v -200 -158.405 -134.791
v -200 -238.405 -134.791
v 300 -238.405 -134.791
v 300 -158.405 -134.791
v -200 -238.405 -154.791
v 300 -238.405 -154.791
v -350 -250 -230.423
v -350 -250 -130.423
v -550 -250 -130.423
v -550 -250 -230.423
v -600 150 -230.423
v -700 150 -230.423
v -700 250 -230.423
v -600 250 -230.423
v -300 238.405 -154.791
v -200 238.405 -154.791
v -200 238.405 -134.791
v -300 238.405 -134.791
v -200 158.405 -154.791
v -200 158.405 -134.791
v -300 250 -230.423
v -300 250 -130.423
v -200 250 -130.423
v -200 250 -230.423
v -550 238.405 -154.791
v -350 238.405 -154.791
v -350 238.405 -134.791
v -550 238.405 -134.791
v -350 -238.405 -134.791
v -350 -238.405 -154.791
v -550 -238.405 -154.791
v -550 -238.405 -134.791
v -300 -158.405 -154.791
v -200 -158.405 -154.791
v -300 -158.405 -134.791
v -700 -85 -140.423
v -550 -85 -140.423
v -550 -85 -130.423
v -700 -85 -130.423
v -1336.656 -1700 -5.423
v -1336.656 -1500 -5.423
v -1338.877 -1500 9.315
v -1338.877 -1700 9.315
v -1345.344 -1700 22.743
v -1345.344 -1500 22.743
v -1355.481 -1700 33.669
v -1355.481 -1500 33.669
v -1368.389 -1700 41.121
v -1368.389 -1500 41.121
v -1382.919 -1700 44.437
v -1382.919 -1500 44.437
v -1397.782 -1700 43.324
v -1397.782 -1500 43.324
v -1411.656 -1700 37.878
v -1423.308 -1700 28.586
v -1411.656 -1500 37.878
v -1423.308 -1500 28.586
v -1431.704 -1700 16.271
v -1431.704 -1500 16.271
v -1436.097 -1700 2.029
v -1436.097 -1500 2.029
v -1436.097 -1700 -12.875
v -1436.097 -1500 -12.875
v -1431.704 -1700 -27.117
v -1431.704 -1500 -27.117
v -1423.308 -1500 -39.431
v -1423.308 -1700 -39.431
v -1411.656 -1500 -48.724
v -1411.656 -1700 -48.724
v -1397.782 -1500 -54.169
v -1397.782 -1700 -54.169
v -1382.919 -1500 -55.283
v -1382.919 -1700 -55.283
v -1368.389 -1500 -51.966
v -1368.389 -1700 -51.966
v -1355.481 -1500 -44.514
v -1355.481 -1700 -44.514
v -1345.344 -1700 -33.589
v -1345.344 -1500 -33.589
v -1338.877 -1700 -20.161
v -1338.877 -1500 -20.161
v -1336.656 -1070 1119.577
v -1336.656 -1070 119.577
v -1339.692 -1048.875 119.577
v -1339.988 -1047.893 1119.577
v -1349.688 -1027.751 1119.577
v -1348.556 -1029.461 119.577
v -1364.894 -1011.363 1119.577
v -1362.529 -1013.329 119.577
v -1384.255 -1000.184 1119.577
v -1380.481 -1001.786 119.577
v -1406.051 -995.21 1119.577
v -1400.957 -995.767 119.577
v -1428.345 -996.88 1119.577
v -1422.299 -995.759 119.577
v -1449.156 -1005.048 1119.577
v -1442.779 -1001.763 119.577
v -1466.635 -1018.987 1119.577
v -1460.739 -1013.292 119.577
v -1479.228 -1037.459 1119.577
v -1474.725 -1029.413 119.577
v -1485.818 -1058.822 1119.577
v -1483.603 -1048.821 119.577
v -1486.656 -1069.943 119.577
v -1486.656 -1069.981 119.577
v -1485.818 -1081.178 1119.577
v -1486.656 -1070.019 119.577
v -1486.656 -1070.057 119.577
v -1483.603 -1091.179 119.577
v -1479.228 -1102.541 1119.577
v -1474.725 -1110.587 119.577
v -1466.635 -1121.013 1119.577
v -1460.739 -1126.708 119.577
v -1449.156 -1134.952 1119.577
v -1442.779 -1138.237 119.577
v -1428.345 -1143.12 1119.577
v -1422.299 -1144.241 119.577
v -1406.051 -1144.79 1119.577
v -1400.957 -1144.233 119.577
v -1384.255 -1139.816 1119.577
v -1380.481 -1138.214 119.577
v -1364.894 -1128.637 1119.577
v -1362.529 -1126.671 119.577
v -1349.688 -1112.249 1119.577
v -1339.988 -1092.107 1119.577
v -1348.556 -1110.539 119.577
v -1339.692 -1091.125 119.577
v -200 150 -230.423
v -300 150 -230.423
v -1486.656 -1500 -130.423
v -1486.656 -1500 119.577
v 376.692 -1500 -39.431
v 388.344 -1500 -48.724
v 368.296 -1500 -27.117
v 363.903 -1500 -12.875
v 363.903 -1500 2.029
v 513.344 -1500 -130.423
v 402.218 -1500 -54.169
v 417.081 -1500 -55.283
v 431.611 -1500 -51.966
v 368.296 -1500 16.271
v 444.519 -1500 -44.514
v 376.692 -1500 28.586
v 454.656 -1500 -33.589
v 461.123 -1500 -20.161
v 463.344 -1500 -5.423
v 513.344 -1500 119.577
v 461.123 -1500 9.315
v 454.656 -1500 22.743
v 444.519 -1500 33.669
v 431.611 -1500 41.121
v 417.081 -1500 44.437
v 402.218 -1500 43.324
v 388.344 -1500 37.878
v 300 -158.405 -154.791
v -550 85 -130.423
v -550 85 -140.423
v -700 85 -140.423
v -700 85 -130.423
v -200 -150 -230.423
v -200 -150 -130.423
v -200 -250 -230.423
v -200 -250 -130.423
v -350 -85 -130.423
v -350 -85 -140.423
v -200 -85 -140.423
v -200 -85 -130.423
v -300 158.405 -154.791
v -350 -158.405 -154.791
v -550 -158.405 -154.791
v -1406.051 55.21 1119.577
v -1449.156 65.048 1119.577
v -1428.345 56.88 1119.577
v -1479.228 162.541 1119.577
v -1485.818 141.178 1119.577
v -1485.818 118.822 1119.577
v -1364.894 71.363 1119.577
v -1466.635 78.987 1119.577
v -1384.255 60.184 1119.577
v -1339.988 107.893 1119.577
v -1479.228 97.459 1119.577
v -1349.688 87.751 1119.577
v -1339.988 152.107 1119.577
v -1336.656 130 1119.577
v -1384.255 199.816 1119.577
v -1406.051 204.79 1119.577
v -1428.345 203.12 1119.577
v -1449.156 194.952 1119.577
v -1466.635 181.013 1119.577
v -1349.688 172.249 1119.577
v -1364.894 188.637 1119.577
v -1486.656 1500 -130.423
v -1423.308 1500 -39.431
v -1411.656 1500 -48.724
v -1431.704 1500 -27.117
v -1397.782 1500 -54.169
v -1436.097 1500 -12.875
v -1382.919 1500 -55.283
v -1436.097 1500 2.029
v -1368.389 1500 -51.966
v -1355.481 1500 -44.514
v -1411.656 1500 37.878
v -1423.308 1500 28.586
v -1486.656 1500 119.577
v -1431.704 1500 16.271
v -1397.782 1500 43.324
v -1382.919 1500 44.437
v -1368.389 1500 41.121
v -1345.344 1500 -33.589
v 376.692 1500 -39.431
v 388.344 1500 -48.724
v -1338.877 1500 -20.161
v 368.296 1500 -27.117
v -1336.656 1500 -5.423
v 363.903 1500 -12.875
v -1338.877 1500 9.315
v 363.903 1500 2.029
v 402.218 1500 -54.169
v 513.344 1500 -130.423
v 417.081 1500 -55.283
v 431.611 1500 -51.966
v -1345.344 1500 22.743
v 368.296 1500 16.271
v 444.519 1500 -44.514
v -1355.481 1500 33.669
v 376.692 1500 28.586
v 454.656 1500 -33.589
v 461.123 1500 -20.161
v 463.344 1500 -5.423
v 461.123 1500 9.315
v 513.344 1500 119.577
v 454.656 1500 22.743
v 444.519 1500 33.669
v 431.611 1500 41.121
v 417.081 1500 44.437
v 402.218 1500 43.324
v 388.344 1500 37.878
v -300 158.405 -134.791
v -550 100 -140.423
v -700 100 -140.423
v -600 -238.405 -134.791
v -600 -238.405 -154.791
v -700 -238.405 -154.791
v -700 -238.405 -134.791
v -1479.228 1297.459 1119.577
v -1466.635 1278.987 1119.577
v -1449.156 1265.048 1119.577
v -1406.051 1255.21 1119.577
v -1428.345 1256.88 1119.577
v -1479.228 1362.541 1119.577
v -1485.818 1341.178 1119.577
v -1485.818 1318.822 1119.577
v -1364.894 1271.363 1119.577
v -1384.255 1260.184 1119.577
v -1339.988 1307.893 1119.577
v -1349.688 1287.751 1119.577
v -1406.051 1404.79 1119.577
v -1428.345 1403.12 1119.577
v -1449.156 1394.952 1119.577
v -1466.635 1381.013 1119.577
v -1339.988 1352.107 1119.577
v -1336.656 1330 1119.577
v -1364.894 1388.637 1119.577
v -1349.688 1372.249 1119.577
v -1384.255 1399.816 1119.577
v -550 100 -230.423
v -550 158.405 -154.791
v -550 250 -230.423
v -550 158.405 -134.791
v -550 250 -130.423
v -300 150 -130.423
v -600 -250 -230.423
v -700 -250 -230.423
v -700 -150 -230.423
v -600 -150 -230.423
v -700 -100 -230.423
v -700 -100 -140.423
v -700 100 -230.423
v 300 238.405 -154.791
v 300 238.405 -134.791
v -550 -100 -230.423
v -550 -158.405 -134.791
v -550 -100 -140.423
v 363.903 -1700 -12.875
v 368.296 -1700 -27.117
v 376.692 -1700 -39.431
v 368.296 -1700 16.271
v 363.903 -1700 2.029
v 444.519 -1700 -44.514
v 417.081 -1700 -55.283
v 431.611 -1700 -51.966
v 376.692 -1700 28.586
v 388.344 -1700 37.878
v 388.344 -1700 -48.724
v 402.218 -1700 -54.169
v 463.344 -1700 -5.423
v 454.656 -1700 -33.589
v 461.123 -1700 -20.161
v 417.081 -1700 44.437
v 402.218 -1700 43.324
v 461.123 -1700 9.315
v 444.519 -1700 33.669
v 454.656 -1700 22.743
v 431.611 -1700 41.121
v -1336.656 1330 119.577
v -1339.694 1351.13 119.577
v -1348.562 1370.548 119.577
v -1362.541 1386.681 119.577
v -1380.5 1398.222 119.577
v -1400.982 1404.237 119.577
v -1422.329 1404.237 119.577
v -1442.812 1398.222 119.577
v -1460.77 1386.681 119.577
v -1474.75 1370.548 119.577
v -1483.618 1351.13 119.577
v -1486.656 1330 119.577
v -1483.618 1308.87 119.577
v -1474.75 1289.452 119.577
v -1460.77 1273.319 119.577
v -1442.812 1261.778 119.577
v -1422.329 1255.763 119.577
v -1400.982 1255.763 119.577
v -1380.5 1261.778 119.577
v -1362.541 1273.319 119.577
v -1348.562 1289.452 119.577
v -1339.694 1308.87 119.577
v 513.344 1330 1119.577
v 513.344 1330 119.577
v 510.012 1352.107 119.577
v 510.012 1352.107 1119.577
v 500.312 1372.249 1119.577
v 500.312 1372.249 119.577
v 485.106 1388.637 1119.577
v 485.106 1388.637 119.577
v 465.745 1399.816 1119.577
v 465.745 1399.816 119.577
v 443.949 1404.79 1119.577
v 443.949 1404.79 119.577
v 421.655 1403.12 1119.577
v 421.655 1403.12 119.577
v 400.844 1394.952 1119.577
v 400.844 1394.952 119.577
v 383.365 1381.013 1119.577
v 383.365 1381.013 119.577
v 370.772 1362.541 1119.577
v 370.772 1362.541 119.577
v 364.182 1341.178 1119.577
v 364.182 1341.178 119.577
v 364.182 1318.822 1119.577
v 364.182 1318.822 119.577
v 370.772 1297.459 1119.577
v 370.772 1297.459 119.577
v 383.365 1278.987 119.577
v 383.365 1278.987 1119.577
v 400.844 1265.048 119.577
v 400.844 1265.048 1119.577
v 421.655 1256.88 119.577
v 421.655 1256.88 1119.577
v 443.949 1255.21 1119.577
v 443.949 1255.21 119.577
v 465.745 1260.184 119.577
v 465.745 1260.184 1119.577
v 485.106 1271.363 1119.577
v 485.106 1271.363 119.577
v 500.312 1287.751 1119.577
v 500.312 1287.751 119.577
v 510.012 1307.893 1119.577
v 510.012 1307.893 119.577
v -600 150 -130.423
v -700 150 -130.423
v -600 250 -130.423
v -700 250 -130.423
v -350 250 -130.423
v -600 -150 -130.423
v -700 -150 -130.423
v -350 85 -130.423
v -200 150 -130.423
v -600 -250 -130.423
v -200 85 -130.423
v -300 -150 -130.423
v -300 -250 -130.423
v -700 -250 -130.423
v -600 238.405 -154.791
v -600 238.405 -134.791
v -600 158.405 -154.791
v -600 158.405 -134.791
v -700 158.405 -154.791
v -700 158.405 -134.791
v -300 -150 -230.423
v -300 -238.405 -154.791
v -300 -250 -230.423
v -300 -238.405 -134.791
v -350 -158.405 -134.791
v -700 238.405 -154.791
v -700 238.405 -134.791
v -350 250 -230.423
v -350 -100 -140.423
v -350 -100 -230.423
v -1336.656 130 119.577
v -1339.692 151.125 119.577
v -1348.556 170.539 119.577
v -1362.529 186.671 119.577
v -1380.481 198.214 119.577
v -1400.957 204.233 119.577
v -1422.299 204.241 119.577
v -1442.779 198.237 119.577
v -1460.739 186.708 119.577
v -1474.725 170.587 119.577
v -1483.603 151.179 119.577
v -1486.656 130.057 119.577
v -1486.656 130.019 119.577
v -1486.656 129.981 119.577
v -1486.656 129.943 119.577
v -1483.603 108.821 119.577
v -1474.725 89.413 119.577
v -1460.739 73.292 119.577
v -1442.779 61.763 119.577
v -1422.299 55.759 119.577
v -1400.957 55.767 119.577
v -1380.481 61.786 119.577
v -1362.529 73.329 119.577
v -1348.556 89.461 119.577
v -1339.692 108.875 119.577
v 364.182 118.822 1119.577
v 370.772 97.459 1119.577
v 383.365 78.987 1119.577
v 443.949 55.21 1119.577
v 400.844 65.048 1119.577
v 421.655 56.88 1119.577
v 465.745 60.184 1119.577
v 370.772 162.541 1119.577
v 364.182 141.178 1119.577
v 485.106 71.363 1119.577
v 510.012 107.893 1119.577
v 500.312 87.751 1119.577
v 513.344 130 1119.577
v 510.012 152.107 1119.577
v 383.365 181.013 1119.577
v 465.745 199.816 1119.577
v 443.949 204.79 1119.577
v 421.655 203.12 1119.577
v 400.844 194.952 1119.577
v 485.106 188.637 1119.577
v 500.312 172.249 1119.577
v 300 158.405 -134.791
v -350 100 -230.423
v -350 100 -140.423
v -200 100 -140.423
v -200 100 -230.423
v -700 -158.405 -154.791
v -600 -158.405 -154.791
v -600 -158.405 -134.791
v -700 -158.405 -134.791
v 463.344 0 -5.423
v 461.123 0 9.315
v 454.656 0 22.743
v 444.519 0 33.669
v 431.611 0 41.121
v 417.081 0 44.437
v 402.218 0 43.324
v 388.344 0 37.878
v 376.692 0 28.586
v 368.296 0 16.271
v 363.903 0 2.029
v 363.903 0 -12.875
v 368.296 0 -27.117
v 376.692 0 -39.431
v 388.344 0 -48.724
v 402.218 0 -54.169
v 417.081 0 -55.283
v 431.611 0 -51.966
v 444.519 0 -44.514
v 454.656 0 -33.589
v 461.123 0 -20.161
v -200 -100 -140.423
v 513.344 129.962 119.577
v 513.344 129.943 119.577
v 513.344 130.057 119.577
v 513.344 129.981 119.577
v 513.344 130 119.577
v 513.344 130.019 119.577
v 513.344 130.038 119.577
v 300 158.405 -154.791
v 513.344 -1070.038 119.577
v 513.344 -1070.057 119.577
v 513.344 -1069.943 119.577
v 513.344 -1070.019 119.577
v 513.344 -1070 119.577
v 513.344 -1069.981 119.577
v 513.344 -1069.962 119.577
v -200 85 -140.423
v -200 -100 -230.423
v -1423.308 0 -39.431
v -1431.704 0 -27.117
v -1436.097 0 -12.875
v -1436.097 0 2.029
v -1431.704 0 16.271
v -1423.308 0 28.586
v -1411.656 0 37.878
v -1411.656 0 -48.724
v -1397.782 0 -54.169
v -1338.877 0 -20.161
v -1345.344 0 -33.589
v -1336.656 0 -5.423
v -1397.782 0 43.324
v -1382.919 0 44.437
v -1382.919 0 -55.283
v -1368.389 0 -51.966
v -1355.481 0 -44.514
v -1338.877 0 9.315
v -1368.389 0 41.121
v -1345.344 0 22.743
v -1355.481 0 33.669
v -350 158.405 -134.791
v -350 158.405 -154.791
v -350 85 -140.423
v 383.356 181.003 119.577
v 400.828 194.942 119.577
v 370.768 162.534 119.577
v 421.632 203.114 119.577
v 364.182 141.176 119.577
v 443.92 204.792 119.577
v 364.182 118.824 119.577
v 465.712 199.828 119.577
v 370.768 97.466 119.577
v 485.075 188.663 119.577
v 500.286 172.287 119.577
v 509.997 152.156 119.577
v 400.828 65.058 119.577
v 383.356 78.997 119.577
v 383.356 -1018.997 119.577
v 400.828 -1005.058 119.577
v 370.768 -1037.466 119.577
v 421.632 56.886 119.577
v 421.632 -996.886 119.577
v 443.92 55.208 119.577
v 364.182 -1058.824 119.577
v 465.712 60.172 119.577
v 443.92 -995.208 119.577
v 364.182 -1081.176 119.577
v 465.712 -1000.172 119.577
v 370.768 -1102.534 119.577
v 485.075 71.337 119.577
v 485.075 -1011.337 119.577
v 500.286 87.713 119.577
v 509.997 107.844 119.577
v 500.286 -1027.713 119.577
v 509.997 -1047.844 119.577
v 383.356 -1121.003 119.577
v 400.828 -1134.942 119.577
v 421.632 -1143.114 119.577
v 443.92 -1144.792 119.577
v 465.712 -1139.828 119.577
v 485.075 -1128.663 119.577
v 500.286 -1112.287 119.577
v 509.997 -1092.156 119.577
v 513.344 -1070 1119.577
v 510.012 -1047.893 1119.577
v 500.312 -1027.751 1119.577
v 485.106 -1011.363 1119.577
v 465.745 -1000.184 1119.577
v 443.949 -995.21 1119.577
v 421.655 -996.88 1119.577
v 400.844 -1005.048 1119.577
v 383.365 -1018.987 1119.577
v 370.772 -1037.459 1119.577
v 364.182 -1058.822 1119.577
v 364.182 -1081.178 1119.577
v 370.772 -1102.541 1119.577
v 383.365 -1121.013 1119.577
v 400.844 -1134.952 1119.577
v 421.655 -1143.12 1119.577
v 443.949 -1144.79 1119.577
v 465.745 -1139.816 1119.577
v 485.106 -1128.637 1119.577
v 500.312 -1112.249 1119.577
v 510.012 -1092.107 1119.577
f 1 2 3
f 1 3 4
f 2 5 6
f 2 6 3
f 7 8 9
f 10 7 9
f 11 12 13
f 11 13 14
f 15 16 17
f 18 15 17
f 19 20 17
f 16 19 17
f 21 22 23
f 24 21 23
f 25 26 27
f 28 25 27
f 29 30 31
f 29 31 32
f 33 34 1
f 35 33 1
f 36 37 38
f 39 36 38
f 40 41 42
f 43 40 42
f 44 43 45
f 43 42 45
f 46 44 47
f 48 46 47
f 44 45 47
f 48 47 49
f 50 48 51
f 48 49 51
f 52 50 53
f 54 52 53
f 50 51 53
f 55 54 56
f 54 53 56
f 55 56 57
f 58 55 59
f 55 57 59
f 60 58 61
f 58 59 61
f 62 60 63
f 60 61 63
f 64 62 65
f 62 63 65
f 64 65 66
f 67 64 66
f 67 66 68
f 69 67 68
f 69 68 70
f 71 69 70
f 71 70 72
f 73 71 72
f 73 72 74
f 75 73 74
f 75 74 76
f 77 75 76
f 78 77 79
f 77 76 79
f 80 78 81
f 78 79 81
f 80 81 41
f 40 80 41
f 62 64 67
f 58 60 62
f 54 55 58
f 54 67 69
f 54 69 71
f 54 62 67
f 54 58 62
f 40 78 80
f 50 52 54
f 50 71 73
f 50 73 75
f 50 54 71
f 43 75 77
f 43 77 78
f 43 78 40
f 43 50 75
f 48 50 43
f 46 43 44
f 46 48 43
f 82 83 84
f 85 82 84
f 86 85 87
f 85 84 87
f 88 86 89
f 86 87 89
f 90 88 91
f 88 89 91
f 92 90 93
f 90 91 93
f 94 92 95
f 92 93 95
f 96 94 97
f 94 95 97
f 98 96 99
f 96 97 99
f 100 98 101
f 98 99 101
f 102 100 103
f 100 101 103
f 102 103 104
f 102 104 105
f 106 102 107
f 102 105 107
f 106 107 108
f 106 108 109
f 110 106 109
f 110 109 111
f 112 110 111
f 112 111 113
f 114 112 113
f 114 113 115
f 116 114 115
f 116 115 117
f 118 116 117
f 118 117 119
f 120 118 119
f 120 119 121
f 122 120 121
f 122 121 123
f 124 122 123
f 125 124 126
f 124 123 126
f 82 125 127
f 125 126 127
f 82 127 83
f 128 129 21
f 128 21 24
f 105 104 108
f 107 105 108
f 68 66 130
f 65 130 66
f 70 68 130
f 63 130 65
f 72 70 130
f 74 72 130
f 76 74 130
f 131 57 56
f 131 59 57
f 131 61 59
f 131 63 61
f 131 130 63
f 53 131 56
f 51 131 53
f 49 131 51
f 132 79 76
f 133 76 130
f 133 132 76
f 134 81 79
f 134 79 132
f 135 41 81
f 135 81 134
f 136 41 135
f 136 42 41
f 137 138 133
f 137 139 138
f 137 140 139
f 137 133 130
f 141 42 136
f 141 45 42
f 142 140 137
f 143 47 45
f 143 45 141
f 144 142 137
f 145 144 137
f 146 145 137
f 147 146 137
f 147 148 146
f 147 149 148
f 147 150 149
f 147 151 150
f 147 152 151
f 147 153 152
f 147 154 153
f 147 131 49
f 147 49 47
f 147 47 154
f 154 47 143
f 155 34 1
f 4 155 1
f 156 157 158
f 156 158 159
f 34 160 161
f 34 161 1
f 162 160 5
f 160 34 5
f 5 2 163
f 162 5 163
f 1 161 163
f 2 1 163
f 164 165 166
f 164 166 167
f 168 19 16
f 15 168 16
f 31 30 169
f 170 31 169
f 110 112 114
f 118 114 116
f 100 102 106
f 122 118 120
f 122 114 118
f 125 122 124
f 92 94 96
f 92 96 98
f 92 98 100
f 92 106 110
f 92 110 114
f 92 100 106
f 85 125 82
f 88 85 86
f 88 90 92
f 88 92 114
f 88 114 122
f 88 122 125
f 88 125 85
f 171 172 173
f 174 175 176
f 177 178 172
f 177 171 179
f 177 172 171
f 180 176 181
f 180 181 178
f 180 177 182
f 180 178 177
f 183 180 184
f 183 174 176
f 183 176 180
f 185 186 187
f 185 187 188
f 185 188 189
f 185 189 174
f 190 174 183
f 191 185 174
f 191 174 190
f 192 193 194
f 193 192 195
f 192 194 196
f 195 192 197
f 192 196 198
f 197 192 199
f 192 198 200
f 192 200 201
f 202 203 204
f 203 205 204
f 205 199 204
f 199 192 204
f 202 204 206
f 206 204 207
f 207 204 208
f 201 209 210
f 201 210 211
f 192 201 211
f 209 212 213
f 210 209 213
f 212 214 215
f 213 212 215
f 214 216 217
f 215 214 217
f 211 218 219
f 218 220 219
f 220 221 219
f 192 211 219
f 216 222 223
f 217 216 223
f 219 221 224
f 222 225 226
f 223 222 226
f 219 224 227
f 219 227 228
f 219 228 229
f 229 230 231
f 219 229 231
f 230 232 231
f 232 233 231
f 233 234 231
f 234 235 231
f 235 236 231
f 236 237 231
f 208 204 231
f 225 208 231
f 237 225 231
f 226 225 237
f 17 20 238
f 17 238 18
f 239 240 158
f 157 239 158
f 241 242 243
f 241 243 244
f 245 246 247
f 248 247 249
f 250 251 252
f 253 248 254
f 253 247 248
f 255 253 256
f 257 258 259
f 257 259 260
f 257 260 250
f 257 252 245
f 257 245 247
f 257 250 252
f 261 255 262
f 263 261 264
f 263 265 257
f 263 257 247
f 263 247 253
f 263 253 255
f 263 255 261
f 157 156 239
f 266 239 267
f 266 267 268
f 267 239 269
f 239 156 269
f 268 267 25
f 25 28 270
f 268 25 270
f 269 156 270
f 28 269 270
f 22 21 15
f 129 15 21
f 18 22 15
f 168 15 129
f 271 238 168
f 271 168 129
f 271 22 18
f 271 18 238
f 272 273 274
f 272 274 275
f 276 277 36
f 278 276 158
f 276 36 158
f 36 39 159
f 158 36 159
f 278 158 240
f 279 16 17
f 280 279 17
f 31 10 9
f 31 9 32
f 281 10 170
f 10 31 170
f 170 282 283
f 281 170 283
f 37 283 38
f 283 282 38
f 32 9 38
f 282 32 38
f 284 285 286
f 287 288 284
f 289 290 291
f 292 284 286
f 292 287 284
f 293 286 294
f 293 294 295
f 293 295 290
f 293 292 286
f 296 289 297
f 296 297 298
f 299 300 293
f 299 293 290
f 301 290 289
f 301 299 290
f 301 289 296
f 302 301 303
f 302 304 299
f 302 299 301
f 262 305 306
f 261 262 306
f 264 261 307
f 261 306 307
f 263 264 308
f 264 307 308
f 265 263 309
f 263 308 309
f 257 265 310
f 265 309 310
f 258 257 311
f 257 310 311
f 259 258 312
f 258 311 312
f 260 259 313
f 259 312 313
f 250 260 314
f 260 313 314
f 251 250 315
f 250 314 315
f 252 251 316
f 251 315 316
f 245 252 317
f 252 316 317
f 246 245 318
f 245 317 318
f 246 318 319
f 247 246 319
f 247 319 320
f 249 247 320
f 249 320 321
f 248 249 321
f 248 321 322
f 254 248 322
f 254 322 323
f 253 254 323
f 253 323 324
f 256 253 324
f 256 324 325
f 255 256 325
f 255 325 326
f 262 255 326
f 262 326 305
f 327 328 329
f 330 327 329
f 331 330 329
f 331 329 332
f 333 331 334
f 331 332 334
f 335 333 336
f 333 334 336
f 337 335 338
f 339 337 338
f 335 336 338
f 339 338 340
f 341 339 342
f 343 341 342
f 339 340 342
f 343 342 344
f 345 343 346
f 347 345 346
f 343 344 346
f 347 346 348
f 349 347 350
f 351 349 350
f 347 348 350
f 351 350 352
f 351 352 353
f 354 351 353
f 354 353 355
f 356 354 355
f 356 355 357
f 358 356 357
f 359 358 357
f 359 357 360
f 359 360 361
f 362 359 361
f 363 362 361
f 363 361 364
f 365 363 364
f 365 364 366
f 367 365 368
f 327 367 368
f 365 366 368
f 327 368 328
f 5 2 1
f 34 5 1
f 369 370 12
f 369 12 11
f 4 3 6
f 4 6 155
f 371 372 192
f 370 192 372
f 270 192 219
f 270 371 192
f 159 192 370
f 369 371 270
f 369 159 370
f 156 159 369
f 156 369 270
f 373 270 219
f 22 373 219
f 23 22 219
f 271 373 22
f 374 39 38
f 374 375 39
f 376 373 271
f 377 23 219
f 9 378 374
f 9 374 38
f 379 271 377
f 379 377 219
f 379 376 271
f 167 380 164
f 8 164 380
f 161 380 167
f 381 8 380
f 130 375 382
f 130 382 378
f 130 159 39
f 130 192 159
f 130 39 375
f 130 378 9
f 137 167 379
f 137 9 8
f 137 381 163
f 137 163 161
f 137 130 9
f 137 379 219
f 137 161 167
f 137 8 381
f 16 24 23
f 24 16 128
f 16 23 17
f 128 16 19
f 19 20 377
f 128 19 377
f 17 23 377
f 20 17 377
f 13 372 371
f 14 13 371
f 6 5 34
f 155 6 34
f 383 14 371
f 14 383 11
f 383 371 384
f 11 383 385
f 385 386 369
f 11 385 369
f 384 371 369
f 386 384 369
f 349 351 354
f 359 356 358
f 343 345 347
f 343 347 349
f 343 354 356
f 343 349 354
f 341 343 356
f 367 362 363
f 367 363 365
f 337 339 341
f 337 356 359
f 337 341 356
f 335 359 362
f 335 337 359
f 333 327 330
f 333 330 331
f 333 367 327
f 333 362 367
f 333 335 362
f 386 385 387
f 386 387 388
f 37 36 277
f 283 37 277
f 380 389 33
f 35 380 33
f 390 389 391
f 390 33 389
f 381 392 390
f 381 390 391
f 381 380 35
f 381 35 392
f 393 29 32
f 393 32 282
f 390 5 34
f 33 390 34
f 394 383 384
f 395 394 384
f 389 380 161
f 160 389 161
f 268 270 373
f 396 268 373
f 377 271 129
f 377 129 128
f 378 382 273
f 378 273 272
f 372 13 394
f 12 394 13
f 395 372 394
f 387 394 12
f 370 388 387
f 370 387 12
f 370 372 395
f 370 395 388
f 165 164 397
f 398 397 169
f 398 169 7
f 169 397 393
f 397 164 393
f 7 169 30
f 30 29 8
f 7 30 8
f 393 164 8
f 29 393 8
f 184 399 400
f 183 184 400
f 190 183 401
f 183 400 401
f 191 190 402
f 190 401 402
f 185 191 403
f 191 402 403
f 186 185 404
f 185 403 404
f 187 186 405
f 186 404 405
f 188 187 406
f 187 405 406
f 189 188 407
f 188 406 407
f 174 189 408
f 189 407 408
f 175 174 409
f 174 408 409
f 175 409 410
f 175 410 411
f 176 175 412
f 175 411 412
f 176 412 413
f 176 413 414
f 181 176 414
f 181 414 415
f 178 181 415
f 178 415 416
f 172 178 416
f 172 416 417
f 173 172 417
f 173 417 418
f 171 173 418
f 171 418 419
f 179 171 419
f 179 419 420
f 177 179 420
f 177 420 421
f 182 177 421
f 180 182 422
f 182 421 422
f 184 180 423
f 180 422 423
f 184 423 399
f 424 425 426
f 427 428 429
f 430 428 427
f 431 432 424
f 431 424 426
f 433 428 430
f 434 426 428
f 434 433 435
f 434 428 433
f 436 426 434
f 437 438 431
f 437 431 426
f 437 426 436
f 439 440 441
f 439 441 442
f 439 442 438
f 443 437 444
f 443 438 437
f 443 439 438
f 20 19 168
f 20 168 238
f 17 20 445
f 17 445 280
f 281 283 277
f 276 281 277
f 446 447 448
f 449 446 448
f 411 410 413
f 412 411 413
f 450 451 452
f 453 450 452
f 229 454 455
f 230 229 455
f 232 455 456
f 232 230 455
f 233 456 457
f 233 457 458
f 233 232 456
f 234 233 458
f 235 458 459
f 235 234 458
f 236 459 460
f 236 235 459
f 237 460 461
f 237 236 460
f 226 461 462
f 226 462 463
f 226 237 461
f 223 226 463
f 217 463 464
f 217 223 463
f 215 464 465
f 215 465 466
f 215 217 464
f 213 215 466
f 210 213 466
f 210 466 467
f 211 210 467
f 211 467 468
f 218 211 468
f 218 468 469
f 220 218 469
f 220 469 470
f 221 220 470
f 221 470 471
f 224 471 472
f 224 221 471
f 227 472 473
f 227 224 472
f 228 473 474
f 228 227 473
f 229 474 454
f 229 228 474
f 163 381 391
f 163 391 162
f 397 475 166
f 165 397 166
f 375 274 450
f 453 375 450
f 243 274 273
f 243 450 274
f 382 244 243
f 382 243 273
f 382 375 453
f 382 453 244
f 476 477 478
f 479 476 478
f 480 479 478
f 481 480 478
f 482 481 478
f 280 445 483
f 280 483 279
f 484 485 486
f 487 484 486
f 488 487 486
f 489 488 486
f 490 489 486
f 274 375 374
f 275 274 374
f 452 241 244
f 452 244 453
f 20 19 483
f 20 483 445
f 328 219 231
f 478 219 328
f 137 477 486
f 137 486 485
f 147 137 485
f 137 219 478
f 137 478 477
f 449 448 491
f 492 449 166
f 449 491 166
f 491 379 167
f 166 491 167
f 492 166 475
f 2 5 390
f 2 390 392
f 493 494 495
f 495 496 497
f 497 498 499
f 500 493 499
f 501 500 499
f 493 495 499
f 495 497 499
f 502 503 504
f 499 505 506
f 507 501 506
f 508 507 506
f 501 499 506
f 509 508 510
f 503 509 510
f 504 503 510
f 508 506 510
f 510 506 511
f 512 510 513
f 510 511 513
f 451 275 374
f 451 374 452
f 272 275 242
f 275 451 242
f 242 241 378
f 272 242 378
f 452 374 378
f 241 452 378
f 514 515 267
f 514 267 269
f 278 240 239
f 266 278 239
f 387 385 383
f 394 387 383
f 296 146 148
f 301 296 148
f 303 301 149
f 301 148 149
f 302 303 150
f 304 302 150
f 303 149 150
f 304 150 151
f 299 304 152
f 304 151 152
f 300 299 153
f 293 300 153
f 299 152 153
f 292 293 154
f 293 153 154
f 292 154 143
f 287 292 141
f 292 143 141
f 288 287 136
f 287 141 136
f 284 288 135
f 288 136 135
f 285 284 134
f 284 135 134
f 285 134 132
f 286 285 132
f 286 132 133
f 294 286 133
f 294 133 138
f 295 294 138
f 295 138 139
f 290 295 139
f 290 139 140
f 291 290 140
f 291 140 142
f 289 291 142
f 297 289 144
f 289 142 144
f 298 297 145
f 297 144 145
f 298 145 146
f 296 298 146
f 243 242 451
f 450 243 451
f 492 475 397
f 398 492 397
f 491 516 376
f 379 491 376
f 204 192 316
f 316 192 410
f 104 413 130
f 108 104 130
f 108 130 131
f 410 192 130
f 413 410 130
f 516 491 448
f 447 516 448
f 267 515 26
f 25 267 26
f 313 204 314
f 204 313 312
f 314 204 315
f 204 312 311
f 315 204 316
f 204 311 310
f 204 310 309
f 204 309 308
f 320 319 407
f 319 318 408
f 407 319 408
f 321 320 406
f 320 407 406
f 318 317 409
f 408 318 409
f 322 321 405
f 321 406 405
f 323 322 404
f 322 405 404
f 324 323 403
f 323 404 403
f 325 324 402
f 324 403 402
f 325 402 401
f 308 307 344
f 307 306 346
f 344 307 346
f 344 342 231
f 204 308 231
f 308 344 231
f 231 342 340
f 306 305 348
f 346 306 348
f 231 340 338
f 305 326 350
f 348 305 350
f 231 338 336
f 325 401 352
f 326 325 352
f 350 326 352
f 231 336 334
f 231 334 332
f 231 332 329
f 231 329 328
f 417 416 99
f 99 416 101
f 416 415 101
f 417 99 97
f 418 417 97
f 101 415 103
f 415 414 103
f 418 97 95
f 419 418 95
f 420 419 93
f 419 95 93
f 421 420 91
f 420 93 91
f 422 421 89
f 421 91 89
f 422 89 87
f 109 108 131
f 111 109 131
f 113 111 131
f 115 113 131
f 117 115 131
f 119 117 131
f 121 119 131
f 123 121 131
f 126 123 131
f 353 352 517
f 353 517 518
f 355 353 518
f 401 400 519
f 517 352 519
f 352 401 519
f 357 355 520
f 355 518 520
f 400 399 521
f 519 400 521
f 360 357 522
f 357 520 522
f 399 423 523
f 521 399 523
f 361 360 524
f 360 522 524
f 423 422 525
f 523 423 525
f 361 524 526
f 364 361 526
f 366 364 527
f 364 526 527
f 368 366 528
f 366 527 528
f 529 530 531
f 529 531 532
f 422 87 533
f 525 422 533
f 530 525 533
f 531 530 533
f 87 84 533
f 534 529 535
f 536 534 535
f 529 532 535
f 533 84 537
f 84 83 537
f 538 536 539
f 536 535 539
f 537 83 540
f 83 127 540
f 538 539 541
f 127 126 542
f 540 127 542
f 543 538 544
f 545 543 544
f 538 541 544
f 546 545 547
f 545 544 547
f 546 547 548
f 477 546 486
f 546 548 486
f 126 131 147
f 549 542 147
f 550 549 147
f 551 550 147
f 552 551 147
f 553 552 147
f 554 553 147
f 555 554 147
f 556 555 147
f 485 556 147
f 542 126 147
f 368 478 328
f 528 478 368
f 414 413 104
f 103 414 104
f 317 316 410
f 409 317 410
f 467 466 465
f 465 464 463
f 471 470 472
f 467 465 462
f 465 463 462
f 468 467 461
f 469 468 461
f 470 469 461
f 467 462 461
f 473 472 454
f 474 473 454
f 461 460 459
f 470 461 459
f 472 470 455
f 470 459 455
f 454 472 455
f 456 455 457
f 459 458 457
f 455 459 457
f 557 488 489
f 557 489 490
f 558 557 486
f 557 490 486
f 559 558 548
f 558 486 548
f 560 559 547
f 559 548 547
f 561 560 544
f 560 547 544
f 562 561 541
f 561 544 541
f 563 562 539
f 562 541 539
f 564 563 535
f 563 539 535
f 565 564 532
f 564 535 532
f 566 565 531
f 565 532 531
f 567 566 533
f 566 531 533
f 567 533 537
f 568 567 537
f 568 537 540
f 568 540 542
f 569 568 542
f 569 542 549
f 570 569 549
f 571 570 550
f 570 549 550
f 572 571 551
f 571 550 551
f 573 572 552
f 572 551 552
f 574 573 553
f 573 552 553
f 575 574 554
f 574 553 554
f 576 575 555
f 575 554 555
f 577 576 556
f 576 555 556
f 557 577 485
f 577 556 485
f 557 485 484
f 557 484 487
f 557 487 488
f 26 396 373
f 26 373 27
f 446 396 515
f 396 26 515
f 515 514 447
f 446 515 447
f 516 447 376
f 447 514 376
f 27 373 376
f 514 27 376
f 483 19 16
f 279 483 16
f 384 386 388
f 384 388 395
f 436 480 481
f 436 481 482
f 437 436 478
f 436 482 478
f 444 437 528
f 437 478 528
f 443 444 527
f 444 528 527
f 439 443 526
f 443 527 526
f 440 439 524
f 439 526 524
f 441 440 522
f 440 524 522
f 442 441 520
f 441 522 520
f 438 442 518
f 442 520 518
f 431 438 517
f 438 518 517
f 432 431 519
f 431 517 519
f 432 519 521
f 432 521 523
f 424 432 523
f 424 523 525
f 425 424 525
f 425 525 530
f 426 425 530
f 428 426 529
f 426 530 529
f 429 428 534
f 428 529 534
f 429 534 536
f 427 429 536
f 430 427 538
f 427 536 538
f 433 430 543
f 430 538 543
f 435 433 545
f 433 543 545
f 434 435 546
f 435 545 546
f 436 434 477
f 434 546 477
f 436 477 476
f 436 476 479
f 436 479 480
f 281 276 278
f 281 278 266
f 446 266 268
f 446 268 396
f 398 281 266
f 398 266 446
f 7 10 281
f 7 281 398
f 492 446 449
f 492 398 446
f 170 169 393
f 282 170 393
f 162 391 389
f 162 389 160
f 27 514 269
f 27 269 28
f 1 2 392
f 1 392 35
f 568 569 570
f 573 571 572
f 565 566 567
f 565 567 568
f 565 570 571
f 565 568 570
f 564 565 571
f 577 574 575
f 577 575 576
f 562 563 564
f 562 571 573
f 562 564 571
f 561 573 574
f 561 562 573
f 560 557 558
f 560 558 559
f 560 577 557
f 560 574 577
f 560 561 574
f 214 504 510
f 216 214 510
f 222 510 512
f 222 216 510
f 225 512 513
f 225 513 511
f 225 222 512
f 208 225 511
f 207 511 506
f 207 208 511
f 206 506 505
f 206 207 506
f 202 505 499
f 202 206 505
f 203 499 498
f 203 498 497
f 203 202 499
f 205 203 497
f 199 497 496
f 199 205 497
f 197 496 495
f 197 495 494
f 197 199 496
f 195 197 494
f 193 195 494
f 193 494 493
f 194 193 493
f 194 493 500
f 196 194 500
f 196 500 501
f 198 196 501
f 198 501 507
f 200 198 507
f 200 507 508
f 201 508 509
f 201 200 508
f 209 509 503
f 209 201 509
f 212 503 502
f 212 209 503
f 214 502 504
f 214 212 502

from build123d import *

# Parameters (mm, degrees)
F0_W           = 2000
F0_H           = 250
F0_R           = 50
F1_DEPTH       = 1500
F2_W           = 100
F2_H           = 100
F3_DEPTH       = 100
F4_W           = 80
F4_H           = 20
F5_DEPTH       = 657
F6_W           = 15
F6_H           = 10
F7_DEPTH       = 150
F8_W           = 15
F8_H           = 10
F9_DEPTH       = 150
F10_R          = 50
F11_DEPTH      = 1500
F11_DEPTH_BACK = 200
F12_R          = 75
F13_DEPTH      = 1000
F14_DEPTH      = 500


with BuildPart() as f1:
    # F0 (on Front) → F1 (new body, symmetric)
    with BuildSketch(Plane.XZ):
        with Locations((-486.6556431055, -5.4227706958)):
            Rectangle(F0_W, F0_H)
        with Locations((-1386.6556431055, -5.4227706958)):
            Circle(F0_R, mode=Mode.SUBTRACT)
        with Locations((413.3443568945, -5.4227706958)):
            Circle(F0_R, mode=Mode.SUBTRACT)
    extrude(amount=F1_DEPTH, both=True)

    # F2 (on face) → F3 (join)
    with BuildSketch(Plane(origin=(0, 0, -130.4227706958), x_dir=(1, 0, 0), z_dir=(0, 0, -1))):
        Polygon((-349.9998092651, 100), (-349.9998092651, 250), (-549.9998092651, 250), (-549.9998092651, 100), (-699.9998092651, 100), (-699.9998092651, -100), (-549.9998092651, -100), (-549.9998092651, -250), (-349.9998092651, -250), (-349.9998092651, -100), (-199.9998092651, -100), (-199.9998092651, 100), align=None)
        with Locations((-649.9998092651, 200)):
            Rectangle(F2_W, F2_H)
        with Locations((-249.9998092651, 200)):
            Rectangle(F2_W, F2_H)
        with Locations((-249.9998092651, -200)):
            Rectangle(F2_W, F2_H)
        with Locations((-649.9998092651, -200)):
            Rectangle(F2_W, F2_H)
    extrude(amount=F3_DEPTH)

    # F4 (on face) → F5 (cut)
    with BuildSketch(Plane.YZ.offset(-199.9998092651)):
        with Locations((198.404931426, -144.7911912203)):
            Rectangle(F4_W, F4_H)
        with Locations((-198.404931426, -144.7911912203)):
            Rectangle(F4_W, F4_H)
    extrude(amount=-F5_DEPTH, mode=Mode.SUBTRACT)

    # F6 (on face) → F7 (cut)
    with BuildSketch(Plane.YZ.offset(-199.9998092651)):
        with Locations((-92.5, -135.4227706958)):
            Rectangle(F6_W, F6_H)
        with Locations((92.5, -135.4227706958)):
            Rectangle(F6_W, F6_H)
    extrude(amount=-F7_DEPTH, mode=Mode.SUBTRACT)

    # F8 (on face) → F9 (cut)
    with BuildSketch(Plane(origin=(-699.9998092651, 0, 0), x_dir=(0, -1, 0), z_dir=(-1, 0, 0))):
        with Locations((92.5, -135.4227706958)):
            Rectangle(F8_W, F8_H)
        with Locations((-92.5, -135.4227706958)):
            Rectangle(F8_W, F8_H)
    extrude(amount=-F9_DEPTH, mode=Mode.SUBTRACT)

    # F10 (on face) → F11 (join, two sides)
    with BuildSketch(Plane.XZ.offset(1500)) as f11_sk:
        with Locations((-1386.6556431055, -5.4227706958)):
            Circle(F10_R)
        with Locations((413.3443568945, -5.4227706958)):
            Circle(F10_R)
    extrude(amount=-F11_DEPTH)
    extrude(f11_sk.sketch, amount=F11_DEPTH_BACK)

    # F12 (on face) → F13 (join)
    with BuildSketch(Plane.XY.offset(119.5772293042)):
        with Locations((-1411.6556431055, 1329.9999952316)):
            Circle(F12_R)
        with Locations((-1411.655664444, -1070.0000047684)):
            Circle(F12_R)
        with Locations((-1411.655664444, 129.9999952316)):
            Circle(F12_R)
        with Locations((438.3443568945, 1329.9999952316)):
            Circle(F12_R)
        with Locations((438.344378233, 129.9999952316)):
            Circle(F12_R)
        with Locations((438.344378233, -1070.0000047684)):
            Circle(F12_R)
    extrude(amount=F13_DEPTH)

    # F4 (on face) → F14 (join)
    with BuildSketch(Plane.YZ.offset(-199.9998092651)):
        with Locations((-198.404931426, -144.7911912203)):
            Rectangle(F4_W, F4_H)
        with Locations((198.404931426, -144.7911912203)):
            Rectangle(F4_W, F4_H)
    extrude(amount=F14_DEPTH)


solid = f1.part
